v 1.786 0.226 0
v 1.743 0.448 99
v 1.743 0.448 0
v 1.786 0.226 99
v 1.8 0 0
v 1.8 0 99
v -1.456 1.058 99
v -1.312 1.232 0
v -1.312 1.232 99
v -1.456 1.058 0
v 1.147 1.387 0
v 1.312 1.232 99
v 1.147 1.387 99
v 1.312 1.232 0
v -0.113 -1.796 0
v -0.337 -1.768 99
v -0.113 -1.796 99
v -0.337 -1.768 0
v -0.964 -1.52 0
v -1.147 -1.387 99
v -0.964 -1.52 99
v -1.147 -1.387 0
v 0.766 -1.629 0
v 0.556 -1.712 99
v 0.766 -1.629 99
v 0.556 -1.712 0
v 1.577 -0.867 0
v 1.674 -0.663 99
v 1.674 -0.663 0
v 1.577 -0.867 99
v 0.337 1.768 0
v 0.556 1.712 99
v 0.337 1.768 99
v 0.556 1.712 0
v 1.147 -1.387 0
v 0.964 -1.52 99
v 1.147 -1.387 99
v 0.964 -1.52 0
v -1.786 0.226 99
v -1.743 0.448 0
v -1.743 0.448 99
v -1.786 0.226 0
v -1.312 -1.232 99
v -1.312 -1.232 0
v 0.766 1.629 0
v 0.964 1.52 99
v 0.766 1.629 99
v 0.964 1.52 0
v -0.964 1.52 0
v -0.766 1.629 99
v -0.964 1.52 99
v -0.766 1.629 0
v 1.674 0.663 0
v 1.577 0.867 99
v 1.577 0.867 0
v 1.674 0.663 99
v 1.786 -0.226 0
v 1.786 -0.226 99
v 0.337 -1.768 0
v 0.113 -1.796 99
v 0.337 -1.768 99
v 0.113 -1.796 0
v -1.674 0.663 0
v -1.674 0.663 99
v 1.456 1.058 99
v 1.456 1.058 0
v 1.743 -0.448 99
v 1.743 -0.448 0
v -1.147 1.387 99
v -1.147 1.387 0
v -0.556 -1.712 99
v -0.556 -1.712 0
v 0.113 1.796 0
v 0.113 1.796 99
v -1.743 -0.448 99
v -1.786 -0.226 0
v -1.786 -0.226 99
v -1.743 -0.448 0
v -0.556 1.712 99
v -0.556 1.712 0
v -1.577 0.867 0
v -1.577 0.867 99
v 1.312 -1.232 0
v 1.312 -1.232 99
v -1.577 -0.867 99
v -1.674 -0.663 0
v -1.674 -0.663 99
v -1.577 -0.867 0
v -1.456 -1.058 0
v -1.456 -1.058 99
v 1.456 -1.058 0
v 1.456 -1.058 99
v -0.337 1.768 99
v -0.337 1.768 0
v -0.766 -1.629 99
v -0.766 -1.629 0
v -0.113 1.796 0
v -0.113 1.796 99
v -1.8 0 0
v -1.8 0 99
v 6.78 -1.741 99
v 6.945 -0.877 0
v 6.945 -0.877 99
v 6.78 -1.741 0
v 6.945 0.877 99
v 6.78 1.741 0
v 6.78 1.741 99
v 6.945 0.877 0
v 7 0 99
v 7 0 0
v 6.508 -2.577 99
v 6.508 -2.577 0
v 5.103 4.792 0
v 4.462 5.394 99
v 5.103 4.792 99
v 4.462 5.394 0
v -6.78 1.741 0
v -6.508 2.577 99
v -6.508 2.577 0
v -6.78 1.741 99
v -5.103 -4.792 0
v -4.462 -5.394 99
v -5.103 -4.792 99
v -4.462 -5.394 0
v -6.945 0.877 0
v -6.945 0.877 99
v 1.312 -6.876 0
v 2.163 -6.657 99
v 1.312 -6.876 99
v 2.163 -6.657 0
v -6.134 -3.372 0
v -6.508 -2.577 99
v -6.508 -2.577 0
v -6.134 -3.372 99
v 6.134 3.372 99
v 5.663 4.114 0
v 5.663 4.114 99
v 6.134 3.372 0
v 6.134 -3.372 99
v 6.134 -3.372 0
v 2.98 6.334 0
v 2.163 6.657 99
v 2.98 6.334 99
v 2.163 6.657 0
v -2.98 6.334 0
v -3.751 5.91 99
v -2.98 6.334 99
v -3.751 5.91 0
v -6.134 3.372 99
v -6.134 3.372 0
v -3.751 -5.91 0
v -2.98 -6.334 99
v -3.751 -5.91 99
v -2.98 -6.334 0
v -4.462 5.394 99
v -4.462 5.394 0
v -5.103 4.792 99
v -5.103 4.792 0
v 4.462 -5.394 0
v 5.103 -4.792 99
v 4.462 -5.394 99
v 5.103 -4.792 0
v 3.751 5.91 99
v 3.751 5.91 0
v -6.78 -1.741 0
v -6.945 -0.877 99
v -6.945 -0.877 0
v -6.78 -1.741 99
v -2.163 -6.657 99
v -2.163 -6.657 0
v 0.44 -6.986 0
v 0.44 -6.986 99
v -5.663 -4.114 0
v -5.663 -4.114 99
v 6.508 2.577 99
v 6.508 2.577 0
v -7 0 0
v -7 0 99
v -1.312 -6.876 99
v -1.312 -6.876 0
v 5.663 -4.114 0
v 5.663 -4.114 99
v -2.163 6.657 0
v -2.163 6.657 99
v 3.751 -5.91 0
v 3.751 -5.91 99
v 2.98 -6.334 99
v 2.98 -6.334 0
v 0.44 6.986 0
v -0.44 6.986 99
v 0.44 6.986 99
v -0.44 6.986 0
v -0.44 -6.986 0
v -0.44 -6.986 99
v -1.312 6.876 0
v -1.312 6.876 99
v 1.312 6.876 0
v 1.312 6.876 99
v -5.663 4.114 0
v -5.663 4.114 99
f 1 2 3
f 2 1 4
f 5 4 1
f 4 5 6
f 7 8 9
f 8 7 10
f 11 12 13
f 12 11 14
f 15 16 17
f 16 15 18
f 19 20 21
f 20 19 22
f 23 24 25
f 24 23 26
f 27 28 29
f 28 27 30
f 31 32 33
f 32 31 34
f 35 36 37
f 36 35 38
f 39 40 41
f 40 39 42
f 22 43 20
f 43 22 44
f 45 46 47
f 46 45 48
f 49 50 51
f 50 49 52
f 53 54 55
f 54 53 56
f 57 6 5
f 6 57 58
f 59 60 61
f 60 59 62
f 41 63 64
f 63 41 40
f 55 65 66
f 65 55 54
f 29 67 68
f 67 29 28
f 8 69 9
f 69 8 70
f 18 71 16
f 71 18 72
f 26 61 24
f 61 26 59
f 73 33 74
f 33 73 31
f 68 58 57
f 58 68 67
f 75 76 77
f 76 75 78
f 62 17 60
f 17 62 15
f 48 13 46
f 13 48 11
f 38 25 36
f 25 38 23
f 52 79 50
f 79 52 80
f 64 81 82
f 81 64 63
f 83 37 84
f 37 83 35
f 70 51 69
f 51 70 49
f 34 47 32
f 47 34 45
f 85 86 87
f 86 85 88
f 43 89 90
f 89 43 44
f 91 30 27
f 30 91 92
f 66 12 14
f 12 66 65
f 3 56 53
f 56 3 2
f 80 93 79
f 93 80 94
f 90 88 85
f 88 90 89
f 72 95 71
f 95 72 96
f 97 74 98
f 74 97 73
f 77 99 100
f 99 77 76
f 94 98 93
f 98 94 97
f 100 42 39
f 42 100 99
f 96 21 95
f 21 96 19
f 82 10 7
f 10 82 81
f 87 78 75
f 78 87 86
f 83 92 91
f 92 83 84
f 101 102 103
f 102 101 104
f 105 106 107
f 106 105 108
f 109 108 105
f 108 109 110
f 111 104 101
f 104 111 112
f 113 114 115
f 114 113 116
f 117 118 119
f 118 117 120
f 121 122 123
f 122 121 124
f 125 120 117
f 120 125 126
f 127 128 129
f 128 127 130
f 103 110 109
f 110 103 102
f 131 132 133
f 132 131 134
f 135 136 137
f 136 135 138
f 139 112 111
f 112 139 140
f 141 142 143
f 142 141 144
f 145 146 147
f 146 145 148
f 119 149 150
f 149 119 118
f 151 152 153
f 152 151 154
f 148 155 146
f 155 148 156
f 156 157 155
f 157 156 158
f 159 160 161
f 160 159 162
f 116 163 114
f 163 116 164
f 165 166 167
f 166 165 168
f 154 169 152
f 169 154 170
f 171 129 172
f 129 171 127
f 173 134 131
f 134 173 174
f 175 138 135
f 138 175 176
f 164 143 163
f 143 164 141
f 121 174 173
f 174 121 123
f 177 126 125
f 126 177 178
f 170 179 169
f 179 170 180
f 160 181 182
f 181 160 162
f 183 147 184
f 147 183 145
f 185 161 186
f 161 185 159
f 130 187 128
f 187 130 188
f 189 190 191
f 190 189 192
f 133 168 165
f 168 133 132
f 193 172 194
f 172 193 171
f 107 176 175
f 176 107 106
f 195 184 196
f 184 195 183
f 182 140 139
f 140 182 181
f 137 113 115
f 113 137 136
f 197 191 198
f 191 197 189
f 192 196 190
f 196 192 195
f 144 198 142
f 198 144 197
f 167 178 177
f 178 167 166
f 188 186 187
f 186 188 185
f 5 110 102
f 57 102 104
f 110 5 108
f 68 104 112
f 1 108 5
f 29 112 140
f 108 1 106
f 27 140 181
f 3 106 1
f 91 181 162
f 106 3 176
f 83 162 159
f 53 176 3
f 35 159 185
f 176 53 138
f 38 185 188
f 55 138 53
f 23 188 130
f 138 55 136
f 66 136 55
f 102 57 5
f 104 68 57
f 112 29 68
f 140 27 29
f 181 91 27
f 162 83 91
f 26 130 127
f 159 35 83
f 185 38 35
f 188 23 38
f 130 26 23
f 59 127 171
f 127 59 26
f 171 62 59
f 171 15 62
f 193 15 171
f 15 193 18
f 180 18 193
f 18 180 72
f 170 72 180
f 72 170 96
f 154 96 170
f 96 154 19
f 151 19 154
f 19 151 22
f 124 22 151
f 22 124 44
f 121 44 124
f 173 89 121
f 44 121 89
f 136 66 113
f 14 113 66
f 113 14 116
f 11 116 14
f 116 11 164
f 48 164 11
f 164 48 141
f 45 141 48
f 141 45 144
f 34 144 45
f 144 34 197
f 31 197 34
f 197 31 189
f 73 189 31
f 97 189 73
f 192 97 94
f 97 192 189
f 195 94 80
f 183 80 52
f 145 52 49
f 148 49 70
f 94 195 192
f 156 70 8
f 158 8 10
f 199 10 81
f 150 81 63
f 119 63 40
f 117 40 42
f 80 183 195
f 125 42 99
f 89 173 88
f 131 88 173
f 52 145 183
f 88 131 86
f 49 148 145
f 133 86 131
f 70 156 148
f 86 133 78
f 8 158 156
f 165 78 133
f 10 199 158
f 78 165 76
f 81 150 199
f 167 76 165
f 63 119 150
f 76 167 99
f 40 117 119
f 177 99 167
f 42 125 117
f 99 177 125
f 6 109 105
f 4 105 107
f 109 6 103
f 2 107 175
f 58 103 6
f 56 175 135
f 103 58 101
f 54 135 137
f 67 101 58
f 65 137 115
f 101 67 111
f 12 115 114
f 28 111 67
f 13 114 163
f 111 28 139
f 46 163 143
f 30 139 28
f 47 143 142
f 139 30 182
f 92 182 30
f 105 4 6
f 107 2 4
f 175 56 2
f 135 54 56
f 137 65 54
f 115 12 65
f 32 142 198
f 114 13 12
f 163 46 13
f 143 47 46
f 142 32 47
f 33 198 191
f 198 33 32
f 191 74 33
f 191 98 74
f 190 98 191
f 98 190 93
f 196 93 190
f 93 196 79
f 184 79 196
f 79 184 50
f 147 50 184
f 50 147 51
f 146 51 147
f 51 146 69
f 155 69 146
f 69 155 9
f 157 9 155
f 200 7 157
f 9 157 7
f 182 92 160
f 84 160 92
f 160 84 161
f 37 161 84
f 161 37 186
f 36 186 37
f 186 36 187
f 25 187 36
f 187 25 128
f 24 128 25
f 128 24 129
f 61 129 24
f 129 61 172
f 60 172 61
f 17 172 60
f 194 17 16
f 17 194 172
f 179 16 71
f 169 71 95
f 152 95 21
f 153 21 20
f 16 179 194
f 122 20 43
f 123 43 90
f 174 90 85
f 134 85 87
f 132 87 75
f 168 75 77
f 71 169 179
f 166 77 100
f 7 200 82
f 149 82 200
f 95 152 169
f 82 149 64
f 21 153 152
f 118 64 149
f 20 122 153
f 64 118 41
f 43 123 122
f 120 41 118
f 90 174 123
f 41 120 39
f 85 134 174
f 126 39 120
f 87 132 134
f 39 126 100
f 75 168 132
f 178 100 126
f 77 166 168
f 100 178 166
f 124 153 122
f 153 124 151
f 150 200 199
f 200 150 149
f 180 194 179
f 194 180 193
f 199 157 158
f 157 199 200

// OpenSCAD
$fn = 50;


difference() {
	union() {
		cylinder(h = 99, r = 7.0000000000);
	}
	union() {
		translate(v = [0, 0, -100]) {
			cylinder(h = 200, r = 1.8000000000);
		}
		translate(v = [0, 0, -100]) {
			cylinder(h = 200, r = 1.8000000000);
		}
	}
}
